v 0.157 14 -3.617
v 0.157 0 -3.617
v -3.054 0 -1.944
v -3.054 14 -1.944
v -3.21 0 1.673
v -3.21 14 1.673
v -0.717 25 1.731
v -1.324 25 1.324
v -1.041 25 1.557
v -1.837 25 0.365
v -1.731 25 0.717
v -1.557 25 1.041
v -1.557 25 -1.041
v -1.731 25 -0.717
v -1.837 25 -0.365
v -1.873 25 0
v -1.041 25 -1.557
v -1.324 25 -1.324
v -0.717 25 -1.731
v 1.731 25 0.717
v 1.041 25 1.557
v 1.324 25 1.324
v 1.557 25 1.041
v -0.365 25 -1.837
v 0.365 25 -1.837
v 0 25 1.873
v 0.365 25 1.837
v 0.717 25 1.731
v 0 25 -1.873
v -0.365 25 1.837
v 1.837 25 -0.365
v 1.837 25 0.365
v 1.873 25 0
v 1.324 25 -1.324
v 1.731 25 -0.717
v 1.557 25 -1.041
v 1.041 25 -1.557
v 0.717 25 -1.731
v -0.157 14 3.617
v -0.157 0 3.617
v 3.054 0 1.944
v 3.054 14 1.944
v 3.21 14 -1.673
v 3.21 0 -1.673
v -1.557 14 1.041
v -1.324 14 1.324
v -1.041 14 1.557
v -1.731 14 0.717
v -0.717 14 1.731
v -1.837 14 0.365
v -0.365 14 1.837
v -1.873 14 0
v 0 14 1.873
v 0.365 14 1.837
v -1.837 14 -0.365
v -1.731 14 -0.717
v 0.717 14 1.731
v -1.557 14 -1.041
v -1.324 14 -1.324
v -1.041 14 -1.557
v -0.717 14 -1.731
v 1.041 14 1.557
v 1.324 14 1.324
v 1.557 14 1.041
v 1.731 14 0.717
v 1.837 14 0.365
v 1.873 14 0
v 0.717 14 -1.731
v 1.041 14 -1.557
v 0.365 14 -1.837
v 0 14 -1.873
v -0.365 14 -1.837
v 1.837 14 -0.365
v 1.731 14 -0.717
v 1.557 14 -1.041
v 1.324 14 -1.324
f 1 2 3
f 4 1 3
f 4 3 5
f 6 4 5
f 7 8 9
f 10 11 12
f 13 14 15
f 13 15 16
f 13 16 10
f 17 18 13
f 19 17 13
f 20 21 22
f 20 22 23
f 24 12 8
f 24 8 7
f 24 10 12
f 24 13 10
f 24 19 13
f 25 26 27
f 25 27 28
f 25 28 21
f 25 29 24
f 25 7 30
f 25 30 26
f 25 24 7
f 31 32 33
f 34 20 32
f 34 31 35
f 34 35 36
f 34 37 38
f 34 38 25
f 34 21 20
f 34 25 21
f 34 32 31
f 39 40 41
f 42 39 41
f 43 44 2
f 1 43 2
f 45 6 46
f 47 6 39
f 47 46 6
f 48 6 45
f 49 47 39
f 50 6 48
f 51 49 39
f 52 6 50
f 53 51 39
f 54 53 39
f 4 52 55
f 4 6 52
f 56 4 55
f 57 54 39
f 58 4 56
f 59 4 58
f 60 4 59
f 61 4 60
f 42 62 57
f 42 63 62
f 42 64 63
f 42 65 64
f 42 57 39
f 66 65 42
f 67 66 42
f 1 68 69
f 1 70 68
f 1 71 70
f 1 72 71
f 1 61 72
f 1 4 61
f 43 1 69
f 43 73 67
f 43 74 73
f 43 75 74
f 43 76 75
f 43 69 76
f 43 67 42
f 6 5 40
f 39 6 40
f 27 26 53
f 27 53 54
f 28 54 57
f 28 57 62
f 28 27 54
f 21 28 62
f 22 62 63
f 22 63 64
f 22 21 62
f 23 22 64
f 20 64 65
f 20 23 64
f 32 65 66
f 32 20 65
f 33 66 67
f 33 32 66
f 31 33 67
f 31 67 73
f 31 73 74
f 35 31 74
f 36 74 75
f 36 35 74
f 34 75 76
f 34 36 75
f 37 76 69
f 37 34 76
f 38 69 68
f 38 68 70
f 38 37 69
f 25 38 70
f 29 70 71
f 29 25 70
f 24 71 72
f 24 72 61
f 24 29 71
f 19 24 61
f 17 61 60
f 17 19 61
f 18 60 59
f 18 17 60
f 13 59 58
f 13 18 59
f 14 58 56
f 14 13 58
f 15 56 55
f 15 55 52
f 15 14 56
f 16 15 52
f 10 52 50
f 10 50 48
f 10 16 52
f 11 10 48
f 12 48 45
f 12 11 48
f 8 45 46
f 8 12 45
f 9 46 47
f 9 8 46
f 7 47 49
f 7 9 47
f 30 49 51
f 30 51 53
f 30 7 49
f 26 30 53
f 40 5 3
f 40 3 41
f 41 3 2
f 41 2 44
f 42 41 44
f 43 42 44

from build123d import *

# Parameters (mm, degrees)
BOSS_EXTRUDE1_DEPTH = 25
SKETCH2_OUTSIDE_W   = 13.782
SKETCH2_OUTSIDE_H   = 14.596
SKETCH2_OUTSIDE_R   = 1.873084861
CUT_EXTRUDE1_DEPTH  = 11


with BuildPart() as part:
    # Sketch1 → Boss-Extrude1 (new body)
    with BuildSketch(Plane(origin=(0, 0, 0), x_dir=(1, 0, 0), z_dir=(0, 1, 0))):
        Polygon((3.210447175, 1.67252173), (0.156777281, 3.616589676), (-3.053669894, 1.944067946), (-3.210447175, -1.67252173), (-0.156777281, -3.616589676), (3.053669894, -1.944067946), align=None)
    extrude(amount=BOSS_EXTRUDE1_DEPTH)

    # Sketch2 outside → Cut-Extrude1 (cut)
    with BuildSketch(Plane(origin=(0, 25, 0), x_dir=(1, 0, 0), z_dir=(0, 1, 0))):
        Rectangle(SKETCH2_OUTSIDE_W, SKETCH2_OUTSIDE_H)
        with Locations(Location((0, 0, 0), (0, 0, 270))):
            Circle(SKETCH2_OUTSIDE_R, mode=Mode.SUBTRACT)
    extrude(amount=-CUT_EXTRUDE1_DEPTH, mode=Mode.SUBTRACT)


solid = part.part
